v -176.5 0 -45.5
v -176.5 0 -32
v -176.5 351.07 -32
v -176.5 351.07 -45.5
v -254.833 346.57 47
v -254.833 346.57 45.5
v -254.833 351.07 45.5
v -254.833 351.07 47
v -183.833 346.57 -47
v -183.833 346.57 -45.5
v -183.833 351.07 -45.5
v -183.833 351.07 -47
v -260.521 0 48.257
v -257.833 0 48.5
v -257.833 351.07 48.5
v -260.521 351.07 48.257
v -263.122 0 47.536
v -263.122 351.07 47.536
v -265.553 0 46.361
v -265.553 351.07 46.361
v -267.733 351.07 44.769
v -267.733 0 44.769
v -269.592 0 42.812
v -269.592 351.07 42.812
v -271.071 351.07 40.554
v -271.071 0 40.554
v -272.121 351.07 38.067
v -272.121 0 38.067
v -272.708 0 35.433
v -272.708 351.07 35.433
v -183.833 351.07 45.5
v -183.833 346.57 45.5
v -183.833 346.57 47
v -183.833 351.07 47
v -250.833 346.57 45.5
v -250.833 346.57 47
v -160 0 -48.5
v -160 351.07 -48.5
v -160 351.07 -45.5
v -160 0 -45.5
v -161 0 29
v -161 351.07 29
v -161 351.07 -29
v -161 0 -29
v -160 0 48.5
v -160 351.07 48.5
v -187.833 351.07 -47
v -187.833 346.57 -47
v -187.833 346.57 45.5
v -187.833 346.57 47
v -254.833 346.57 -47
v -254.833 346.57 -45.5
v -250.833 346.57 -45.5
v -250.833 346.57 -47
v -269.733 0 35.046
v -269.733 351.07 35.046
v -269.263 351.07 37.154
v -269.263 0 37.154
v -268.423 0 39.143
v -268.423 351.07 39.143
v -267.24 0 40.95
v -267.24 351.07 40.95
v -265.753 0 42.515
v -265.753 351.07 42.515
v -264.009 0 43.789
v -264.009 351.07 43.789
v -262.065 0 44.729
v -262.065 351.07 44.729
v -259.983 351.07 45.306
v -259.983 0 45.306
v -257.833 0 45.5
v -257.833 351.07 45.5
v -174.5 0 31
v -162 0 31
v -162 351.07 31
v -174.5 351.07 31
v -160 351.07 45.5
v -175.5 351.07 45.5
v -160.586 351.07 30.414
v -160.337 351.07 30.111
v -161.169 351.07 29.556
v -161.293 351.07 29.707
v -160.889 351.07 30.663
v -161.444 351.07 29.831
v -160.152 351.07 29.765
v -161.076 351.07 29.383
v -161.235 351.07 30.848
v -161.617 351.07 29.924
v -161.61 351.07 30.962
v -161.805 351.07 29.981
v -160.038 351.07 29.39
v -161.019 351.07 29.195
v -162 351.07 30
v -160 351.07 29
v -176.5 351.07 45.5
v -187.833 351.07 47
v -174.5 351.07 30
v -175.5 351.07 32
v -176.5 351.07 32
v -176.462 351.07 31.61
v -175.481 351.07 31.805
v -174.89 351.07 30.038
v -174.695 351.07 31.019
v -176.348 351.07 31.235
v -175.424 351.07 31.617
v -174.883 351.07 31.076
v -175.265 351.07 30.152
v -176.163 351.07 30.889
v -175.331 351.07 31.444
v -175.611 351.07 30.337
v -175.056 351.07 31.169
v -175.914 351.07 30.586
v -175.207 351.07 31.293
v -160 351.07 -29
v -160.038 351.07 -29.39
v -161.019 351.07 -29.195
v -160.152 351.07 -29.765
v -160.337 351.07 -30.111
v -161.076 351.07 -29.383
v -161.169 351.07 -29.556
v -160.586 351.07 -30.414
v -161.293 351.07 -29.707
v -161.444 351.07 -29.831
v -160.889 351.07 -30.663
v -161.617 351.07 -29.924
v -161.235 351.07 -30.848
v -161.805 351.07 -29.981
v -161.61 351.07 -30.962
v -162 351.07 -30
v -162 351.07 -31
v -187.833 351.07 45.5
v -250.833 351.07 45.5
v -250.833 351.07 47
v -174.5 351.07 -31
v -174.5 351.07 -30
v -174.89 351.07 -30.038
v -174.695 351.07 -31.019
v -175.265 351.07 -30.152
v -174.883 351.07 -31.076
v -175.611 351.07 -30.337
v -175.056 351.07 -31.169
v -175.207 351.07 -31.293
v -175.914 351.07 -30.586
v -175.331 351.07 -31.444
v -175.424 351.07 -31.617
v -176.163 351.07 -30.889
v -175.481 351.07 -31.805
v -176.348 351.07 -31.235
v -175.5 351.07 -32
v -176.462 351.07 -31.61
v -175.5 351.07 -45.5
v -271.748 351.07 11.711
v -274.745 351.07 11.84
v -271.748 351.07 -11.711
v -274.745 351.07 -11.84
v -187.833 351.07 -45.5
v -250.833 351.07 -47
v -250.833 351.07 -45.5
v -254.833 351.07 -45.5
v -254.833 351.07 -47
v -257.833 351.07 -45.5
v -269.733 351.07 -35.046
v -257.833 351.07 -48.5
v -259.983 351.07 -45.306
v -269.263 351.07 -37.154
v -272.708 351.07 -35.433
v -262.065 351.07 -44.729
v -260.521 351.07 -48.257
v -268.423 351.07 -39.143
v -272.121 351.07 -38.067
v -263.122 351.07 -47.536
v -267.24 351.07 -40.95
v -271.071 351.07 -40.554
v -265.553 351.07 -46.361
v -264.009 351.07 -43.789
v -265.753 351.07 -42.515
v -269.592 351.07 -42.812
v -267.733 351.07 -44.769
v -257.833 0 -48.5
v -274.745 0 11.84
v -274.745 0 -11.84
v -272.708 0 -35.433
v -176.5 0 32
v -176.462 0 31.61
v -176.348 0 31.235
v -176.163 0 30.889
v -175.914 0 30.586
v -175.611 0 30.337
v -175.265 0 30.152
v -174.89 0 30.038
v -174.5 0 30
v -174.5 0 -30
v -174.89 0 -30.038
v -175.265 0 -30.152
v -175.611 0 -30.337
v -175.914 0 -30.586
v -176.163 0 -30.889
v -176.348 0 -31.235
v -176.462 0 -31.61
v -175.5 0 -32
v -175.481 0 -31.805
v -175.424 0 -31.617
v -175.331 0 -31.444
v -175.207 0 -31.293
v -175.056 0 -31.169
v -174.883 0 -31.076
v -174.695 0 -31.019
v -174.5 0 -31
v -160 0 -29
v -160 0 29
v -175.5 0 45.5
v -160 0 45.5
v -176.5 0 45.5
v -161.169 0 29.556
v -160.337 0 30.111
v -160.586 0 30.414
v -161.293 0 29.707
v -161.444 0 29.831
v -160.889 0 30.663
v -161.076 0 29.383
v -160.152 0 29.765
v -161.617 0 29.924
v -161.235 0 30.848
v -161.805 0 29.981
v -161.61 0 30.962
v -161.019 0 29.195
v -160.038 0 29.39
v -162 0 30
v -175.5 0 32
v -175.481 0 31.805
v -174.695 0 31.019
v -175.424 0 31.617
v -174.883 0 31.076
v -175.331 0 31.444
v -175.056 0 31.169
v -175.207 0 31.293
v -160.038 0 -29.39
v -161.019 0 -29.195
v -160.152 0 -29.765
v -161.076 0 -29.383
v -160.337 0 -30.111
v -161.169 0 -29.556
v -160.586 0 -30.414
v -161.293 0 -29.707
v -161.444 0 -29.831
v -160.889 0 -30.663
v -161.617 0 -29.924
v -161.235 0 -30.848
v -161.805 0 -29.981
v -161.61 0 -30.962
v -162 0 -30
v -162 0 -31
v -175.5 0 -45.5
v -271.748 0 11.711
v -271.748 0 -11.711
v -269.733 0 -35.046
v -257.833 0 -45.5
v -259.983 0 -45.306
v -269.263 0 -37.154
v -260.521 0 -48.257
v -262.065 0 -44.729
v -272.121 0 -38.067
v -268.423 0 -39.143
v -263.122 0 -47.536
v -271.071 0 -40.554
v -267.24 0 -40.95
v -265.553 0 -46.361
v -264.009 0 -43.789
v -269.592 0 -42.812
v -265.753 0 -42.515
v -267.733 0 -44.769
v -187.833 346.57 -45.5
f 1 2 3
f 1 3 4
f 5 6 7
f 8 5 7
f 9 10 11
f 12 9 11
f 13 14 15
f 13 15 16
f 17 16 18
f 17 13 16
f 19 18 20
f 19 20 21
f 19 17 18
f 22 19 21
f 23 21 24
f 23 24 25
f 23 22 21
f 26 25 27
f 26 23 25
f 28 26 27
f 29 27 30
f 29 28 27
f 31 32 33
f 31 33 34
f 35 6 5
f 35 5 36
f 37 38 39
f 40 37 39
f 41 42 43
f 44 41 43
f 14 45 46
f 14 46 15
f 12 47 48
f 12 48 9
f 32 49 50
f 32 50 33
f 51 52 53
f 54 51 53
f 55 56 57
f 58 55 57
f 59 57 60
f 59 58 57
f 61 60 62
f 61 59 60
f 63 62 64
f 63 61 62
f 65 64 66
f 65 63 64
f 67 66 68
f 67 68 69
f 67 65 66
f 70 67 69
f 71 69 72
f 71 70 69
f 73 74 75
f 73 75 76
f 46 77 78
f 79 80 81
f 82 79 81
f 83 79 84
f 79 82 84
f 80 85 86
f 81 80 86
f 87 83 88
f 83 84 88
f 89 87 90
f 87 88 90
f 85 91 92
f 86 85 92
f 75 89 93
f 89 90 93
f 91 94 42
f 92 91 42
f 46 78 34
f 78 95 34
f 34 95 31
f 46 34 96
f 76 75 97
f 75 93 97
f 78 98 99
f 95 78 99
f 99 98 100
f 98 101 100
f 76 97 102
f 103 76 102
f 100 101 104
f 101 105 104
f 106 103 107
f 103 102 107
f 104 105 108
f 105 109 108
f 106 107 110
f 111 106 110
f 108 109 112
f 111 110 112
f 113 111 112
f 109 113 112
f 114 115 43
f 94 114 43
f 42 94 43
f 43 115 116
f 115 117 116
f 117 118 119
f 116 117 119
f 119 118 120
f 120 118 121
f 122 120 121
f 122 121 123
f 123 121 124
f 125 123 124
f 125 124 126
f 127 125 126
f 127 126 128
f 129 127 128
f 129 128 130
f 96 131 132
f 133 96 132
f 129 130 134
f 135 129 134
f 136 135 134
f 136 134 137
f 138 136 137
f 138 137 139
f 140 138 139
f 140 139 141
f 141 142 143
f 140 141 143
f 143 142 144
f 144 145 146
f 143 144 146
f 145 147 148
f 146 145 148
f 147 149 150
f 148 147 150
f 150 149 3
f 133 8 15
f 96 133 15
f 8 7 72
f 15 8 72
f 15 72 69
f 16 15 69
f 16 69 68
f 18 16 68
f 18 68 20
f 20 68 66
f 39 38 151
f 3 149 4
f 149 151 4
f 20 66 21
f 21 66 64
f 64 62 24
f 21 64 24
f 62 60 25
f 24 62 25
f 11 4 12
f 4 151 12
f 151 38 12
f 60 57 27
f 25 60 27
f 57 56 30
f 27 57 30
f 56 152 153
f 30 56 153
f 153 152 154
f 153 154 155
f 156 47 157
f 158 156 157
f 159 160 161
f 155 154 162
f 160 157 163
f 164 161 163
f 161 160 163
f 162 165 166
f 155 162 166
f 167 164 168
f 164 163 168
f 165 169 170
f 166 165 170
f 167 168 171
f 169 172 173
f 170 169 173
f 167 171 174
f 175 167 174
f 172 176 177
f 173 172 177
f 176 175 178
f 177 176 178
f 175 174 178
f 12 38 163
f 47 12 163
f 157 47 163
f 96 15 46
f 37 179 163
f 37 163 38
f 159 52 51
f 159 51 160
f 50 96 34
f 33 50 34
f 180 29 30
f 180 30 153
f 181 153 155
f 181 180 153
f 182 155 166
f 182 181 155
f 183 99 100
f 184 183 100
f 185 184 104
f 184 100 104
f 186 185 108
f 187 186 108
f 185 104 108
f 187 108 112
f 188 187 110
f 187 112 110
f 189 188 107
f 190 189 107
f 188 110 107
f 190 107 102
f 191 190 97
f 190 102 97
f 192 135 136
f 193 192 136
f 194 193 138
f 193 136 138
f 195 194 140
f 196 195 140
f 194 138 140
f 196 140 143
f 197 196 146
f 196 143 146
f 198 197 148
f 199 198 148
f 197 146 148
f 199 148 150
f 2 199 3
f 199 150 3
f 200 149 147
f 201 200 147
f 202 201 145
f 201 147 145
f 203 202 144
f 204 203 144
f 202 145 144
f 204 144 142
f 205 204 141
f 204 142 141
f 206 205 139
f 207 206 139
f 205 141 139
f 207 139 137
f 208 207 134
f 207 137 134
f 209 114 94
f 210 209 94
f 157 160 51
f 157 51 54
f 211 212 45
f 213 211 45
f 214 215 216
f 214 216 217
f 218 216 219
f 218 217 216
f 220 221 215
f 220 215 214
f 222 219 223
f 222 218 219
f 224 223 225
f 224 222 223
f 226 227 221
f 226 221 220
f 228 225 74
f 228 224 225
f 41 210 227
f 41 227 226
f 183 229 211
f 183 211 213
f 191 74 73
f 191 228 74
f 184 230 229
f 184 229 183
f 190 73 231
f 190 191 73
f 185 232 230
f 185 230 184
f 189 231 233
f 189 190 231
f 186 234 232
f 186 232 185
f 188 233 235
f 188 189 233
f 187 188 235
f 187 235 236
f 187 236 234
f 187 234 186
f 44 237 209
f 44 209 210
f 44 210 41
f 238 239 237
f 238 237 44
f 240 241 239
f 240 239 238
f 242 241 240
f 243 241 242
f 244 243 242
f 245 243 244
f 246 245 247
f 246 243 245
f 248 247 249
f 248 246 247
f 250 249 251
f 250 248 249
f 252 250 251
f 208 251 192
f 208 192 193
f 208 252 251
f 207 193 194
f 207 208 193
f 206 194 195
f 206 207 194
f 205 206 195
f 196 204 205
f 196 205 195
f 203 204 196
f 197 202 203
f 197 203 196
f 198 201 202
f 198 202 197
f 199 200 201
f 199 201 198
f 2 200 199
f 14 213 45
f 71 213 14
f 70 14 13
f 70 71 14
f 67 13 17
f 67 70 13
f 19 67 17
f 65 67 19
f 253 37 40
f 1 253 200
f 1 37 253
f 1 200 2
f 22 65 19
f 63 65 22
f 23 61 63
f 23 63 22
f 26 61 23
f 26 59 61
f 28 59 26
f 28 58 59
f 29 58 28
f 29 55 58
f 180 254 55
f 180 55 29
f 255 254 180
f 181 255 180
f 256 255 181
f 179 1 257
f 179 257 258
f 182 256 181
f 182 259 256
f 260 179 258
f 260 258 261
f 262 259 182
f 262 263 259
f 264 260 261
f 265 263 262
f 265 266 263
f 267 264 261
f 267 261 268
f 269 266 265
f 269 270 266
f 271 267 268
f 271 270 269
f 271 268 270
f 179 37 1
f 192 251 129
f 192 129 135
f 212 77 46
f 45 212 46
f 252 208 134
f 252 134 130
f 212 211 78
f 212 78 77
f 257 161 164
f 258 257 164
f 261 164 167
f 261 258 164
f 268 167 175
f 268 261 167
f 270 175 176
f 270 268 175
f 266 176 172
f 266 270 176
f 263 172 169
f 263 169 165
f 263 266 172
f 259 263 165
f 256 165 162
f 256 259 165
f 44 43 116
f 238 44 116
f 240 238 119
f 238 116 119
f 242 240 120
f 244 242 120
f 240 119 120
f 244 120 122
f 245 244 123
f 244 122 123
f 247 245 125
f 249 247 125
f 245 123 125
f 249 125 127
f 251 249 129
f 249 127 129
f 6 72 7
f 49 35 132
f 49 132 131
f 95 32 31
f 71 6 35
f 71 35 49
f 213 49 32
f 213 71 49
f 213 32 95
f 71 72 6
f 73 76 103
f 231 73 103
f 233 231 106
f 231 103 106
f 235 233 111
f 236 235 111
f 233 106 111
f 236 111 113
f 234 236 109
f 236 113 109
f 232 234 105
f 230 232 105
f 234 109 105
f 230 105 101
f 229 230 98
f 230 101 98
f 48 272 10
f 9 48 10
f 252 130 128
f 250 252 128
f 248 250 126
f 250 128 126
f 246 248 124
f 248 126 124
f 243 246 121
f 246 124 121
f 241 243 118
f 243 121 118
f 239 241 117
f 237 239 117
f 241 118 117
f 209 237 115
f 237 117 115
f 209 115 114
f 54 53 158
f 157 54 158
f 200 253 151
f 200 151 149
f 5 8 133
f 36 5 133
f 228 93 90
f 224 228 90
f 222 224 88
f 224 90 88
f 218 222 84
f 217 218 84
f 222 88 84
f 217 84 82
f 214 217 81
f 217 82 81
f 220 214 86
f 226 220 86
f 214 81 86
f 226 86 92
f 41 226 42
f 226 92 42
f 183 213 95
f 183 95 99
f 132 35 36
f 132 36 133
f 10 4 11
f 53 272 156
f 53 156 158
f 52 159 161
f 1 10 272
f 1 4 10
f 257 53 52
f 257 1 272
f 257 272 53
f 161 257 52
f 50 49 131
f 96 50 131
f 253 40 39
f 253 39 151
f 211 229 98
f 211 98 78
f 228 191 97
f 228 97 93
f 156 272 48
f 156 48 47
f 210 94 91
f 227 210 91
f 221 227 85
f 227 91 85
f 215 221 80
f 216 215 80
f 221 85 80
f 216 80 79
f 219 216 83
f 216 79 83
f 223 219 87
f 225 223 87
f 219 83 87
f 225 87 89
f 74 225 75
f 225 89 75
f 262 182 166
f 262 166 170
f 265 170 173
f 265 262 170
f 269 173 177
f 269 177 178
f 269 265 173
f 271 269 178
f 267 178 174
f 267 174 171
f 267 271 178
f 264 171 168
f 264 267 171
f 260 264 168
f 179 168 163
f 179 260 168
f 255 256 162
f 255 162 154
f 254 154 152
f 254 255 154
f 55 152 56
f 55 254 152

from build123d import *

# Parameters (mm, degrees)
BOSS_EXTRUDE1_DEPTH = 351.07
SKETCH2_W           = 4
SKETCH2_H           = 9
CUT_EXTRUDE1_DEPTH  = 1.5
BOSS_EXTRUDE2_DEPTH = 351.07


with BuildPart() as part:
    # Sketch1 → Boss-Extrude1 (new body)
    with BuildSketch(Plane(origin=(0, 0, 0), x_dir=(1, 0, 0), z_dir=(0, 1, 0))):
        with BuildLine():
            Line((-257.832794656, 48.5), (-160, 48.5))
            Line((-160, 48.5), (-160, 45.5))
            Line((-160, 45.5), (-257.832794656, 45.5))
            ThreePointArc((-257.832794656, 45.5), (-265.752584863, 42.515371489), (-269.732769794, 35.046153846))
            ThreePointArc((-269.732769794, 35.046153846), (-272, 0), (-269.732769794, -35.046153846))
            ThreePointArc((-269.732769794, -35.046153846), (-265.752584863, -42.515371489), (-257.832794656, -45.5))
            Line((-257.832794656, -45.5), (-160, -45.5))
            Line((-160, -45.5), (-160, -48.5))
            Line((-160, -48.5), (-257.832794656, -48.5))
            ThreePointArc((-257.832794656, -48.5), (-267.732532415, -44.769214361), (-272.707763578, -35.432692308))
            ThreePointArc((-272.707763578, -35.432692308), (-275, 0), (-272.707763578, 35.432692308))
            ThreePointArc((-272.707763578, 35.432692308), (-267.732532415, 44.769214361), (-257.832794656, 48.5))
        make_face()
    extrude(amount=BOSS_EXTRUDE1_DEPTH)

    # Sketch2 → Cut-Extrude1 (cut)
    with BuildSketch(Plane.XY.offset(-45.5)):
        with Locations((-252.832794656, 351.07)):
            Rectangle(SKETCH2_W, SKETCH2_H)
        with Locations((-185.832794656, 351.07)):
            Rectangle(SKETCH2_W, SKETCH2_H)
    cut_extrude1 = extrude(amount=-CUT_EXTRUDE1_DEPTH, mode=Mode.SUBTRACT)

    # Mirror1: Cut-Extrude1 across plane
    add(cut_extrude1.mirror(Plane.XY), mode=Mode.SUBTRACT)

    # Sketch3 → Boss-Extrude2 (add)
    with BuildSketch(Plane(origin=(0, 351.07, 0), x_dir=(1, 0, 0), z_dir=(0, 1, 0))):
        with BuildLine():
            Line((-176.5, -45.5), (-176.5, -32))
            ThreePointArc((-176.5, -32), (-175.914213562, -30.585786438), (-174.5, -30))
            Line((-174.5, -30), (-162, -30))
            ThreePointArc((-162, -30), (-161.292893219, -29.707106781), (-161, -29))
            Line((-161, -29), (-161, 29))
            ThreePointArc((-161, 29), (-161.292893219, 29.707106781), (-162, 30))
            Line((-162, 30), (-174.5, 30))
            ThreePointArc((-174.5, 30), (-175.914213562, 30.585786438), (-176.5, 32))
            Line((-176.5, 32), (-176.5, 45.5))
            Line((-176.5, 45.5), (-175.5, 45.5))
            Line((-175.5, 45.5), (-175.5, 32))
            ThreePointArc((-175.5, 32), (-175.207106781, 31.292893219), (-174.5, 31))
            Line((-174.5, 31), (-162, 31))
            ThreePointArc((-162, 31), (-160.585786438, 30.414213562), (-160, 29))
            Line((-160, 29), (-160, -29))
            ThreePointArc((-160, -29), (-160.585786438, -30.414213562), (-162, -31))
            Line((-162, -31), (-174.5, -31))
            ThreePointArc((-174.5, -31), (-175.207106781, -31.292893219), (-175.5, -32))
            Line((-175.5, -32), (-175.5, -45.5))
            Line((-175.5, -45.5), (-176.5, -45.5))
        make_face()
    extrude(amount=-BOSS_EXTRUDE2_DEPTH)


solid = part.part
